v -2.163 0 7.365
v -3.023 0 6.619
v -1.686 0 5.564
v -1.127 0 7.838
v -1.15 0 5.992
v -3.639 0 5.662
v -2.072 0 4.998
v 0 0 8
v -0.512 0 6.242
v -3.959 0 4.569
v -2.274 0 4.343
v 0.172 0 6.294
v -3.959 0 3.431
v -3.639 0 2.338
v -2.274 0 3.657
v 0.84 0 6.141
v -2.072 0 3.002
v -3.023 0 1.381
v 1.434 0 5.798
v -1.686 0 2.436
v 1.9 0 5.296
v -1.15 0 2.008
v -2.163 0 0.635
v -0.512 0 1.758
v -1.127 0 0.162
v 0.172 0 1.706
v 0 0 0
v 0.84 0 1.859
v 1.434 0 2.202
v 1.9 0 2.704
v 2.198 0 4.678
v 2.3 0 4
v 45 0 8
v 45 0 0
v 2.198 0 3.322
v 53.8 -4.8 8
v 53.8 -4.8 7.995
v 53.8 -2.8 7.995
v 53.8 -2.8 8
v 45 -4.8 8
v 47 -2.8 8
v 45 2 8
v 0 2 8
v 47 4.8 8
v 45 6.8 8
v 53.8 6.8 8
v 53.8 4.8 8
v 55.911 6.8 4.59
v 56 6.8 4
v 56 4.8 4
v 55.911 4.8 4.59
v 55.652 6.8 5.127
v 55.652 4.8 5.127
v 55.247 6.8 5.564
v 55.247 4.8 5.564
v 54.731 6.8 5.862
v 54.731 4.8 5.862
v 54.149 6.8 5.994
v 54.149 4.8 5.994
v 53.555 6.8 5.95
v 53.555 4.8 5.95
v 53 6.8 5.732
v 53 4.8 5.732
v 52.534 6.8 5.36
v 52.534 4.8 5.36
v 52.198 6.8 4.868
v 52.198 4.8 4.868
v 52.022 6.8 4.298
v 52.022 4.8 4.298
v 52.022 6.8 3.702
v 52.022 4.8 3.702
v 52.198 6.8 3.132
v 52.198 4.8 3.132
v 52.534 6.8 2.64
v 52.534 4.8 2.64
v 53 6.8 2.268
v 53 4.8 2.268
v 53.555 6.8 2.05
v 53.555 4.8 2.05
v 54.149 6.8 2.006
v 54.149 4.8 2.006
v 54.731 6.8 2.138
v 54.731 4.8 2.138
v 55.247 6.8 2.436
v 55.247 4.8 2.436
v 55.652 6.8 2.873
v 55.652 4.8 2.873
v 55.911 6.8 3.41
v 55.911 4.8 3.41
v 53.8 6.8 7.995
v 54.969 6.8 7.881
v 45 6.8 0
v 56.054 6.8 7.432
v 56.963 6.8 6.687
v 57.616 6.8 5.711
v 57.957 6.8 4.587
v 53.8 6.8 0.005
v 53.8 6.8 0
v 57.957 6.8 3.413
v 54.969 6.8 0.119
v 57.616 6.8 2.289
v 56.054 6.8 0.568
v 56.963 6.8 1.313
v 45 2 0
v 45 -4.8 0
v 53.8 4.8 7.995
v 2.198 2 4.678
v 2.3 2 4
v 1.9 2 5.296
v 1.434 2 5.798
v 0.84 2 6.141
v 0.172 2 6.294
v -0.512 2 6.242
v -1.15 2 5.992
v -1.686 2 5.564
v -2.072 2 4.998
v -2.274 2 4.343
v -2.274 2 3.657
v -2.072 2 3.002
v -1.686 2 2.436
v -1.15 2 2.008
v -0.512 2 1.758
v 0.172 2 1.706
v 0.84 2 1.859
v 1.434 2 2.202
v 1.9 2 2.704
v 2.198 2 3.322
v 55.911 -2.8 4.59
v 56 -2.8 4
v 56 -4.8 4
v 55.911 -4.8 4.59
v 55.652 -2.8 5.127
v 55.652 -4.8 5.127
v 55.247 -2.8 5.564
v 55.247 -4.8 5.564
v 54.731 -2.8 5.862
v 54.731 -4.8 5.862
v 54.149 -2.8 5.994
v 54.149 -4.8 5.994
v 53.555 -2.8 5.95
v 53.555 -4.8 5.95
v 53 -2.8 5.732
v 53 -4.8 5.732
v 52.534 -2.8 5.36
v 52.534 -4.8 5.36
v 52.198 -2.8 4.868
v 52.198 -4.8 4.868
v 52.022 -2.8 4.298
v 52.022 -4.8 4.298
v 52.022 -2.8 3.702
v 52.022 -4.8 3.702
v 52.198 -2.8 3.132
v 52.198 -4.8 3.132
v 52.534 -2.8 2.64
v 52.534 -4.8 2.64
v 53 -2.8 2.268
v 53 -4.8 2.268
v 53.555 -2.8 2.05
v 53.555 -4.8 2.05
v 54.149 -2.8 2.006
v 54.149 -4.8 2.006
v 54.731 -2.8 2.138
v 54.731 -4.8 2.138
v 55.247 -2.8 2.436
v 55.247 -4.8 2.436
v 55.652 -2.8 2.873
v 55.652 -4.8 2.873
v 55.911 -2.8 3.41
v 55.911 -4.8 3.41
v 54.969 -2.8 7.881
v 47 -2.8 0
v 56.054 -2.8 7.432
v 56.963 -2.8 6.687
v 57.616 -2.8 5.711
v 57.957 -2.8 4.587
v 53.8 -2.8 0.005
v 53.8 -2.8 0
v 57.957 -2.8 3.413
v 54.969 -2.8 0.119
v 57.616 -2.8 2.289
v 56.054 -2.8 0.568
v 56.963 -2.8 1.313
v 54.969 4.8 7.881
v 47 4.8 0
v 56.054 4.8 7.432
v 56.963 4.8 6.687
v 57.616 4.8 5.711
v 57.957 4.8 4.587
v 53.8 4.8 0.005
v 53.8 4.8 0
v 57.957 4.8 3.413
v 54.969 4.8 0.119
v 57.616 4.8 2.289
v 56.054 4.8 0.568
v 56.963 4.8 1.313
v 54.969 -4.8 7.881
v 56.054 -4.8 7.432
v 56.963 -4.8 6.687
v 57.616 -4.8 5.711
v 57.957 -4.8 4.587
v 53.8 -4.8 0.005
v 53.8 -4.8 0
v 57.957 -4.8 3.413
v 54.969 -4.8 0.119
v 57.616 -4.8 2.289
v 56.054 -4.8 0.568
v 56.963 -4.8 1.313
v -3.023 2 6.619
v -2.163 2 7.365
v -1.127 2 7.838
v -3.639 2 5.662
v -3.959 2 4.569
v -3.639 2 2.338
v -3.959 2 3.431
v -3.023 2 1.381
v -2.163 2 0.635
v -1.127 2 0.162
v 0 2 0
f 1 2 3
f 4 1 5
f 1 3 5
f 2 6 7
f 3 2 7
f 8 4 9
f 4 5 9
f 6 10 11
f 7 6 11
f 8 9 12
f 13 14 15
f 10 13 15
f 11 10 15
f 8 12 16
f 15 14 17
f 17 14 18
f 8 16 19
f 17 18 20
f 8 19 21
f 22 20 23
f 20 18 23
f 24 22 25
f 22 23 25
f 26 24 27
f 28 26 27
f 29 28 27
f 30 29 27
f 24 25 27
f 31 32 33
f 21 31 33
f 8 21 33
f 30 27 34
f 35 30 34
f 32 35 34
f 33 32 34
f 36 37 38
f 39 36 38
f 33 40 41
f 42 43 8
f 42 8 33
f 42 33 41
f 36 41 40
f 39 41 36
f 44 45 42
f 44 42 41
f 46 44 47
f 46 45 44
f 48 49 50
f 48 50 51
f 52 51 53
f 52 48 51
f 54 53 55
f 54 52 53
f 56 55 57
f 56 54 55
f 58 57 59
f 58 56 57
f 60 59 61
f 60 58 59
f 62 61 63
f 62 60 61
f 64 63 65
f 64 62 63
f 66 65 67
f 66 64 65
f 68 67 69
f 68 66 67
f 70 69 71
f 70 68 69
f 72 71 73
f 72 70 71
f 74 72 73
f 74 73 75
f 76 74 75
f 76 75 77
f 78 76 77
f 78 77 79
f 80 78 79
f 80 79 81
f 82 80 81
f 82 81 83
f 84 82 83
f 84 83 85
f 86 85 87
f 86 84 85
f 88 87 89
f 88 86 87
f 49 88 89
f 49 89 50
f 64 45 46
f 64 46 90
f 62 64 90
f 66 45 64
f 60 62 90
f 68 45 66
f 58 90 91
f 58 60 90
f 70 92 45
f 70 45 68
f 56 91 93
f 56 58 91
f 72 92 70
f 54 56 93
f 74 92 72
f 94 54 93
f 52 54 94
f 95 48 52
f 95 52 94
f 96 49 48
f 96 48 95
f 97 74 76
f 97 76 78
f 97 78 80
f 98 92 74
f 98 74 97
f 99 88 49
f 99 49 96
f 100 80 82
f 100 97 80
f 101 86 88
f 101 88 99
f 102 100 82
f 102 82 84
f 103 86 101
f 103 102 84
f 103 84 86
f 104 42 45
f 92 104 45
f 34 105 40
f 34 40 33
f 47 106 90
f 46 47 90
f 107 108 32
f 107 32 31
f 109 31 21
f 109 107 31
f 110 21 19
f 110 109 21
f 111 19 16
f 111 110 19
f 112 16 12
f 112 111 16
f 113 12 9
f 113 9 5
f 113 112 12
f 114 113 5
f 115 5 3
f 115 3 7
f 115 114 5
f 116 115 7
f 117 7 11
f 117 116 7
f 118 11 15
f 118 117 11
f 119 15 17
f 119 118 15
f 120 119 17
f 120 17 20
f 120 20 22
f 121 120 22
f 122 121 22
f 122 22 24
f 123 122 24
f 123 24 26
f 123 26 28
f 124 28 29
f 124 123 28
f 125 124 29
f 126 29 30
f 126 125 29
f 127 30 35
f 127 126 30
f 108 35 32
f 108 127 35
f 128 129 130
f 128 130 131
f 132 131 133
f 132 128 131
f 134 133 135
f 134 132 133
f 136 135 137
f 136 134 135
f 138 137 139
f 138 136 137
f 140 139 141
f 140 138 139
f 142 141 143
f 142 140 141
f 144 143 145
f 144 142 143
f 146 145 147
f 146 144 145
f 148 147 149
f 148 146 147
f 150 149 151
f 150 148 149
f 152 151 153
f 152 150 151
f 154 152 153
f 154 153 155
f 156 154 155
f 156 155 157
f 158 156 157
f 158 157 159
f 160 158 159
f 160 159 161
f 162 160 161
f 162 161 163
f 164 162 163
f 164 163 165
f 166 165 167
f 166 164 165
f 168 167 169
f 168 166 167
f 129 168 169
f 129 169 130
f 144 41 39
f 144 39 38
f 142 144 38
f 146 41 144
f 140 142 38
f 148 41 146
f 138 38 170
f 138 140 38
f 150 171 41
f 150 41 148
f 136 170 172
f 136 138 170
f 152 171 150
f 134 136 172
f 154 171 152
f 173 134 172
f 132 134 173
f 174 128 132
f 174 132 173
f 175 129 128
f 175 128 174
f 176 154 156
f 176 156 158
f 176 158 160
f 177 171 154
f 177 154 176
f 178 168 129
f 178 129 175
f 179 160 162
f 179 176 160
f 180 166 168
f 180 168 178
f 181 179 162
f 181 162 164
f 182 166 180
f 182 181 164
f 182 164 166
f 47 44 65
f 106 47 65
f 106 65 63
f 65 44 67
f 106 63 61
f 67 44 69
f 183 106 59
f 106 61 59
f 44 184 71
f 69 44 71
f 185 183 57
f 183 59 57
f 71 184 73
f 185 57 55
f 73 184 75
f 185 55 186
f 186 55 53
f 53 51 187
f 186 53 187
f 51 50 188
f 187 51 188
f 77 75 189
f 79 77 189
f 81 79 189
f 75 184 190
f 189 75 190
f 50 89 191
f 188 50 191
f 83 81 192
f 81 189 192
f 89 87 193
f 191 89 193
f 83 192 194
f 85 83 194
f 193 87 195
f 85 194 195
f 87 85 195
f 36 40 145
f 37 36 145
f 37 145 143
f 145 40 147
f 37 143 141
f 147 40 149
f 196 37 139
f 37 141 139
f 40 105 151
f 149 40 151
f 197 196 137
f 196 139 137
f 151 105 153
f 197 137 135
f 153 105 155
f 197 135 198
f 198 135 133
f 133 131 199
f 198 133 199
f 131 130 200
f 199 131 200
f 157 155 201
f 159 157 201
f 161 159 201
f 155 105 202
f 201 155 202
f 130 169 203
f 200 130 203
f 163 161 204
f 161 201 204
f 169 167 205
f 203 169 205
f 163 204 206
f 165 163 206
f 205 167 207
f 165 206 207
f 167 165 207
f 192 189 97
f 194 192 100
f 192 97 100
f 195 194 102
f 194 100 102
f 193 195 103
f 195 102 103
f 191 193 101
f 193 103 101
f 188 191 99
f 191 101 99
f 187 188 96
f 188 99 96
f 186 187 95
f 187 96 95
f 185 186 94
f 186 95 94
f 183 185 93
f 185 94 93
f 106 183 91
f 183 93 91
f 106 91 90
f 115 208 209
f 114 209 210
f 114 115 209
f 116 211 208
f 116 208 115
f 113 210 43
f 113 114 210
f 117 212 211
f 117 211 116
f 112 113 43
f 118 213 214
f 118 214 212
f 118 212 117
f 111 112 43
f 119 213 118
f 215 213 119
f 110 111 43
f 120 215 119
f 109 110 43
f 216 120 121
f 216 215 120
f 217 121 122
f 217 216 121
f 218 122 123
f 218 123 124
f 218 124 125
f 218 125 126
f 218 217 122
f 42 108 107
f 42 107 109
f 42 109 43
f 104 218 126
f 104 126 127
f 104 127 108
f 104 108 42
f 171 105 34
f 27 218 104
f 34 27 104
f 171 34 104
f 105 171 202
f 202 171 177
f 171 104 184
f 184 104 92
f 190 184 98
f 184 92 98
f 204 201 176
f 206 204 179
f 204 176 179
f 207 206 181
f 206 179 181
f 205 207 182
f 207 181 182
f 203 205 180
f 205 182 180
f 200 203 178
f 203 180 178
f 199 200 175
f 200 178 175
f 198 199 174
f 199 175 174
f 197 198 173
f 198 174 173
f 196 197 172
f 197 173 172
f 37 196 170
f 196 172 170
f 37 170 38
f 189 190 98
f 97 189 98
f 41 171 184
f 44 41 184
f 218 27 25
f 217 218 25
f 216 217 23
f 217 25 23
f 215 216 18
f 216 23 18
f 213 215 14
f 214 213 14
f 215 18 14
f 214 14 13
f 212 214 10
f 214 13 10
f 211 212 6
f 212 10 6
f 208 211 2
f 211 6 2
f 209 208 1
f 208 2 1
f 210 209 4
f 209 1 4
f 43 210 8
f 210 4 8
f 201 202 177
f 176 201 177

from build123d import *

# Parameters (mm, degrees)
CYLINDER003_R     = 2
CYLINDER003_DEPTH = 2
BOX002_W          = 6.8
BOX002_H          = 2
BOX002_DEPTH      = 8
CYLINDER002_R     = 4
CYLINDER002_DEPTH = 2
CYLINDER001_R     = 2.3
CYLINDER001_DEPTH = 2
CYLINDER_R        = 4
CYLINDER_DEPTH    = 2
BOX_W             = 45
BOX_H             = 2
BOX_DEPTH         = 8
CYLINDER005_R     = 2
CYLINDER005_DEPTH = 2
BOX003_W          = 6.8
BOX003_H          = 2
BOX003_DEPTH      = 8
CYLINDER004_R     = 4
CYLINDER004_DEPTH = 2
BOX001_W          = 2
BOX001_H          = 11.6
BOX001_DEPTH      = 8


with BuildPart() as cylinder003:
    # Cylinder003 → Cylinder003 (new body)
    with BuildSketch(Plane(origin=(54, 6.8, 4), x_dir=(1, 0, 0), z_dir=(0, -1, 0))):
        Circle(CYLINDER003_R)
    extrude(amount=CYLINDER003_DEPTH)


with BuildPart() as cube002:
    # Box002 → Box002 (new body)
    with BuildSketch(Plane(origin=(47, 4.8, 0), x_dir=(1, 0, 0), z_dir=(0, 0, 1))):
        with Locations((3.4, 1)):
            Rectangle(BOX002_W, BOX002_H)
    extrude(amount=BOX002_DEPTH)


with BuildPart() as cut001:
    # Cylinder002 → Cylinder002 (new body)
    with BuildSketch(Plane(origin=(54, 6.8, 4), x_dir=(1, 0, 0), z_dir=(0, -1, 0))):
        Circle(CYLINDER002_R)
    extrude(amount=CYLINDER002_DEPTH)

    # Fusion001: union Cube002
    add(cube002.part)

    # Cut001: cut Cylinder003
    add(cylinder003.part, mode=Mode.SUBTRACT)


with BuildPart() as cylinder001:
    # Cylinder001 → Cylinder001 (new body)
    with BuildSketch(Plane(origin=(0, 2, 4), x_dir=(1, 0, 0), z_dir=(0, -1, 0))):
        Circle(CYLINDER001_R)
    extrude(amount=CYLINDER001_DEPTH)


with BuildPart() as cylinder:
    # Cylinder → Cylinder (new body)
    with BuildSketch(Plane(origin=(0, 0, 4), x_dir=(1, 0, 0), z_dir=(0, 1, 0))):
        Circle(CYLINDER_R)
    extrude(amount=CYLINDER_DEPTH)


with BuildPart() as cut:
    # Box → Box (new body)
    with BuildSketch(Plane.XY):
        with Locations((22.5, 1)):
            Rectangle(BOX_W, BOX_H)
    extrude(amount=BOX_DEPTH)

    # Fusion: union Cylinder
    add(cylinder.part)

    # Cut: cut Cylinder001
    add(cylinder001.part, mode=Mode.SUBTRACT)


with BuildPart() as cylinder005:
    # Cylinder005 → Cylinder005 (new body)
    with BuildSketch(Plane(origin=(54, 6.8, 4), x_dir=(1, 0, 0), z_dir=(0, -1, 0))):
        Circle(CYLINDER005_R)
    extrude(amount=CYLINDER005_DEPTH)


with BuildPart() as cube003:
    # Box003 → Box003 (new body)
    with BuildSketch(Plane(origin=(47, 4.8, 0), x_dir=(1, 0, 0), z_dir=(0, 0, 1))):
        with Locations((3.4, 1)):
            Rectangle(BOX003_W, BOX003_H)
    extrude(amount=BOX003_DEPTH)


with BuildPart() as cut002:
    # Cylinder004 → Cylinder004 (new body)
    with BuildSketch(Plane(origin=(54, 6.8, 4), x_dir=(1, 0, 0), z_dir=(0, -1, 0))):
        Circle(CYLINDER004_R)
    extrude(amount=CYLINDER004_DEPTH)

    # Fusion002: union Cube003
    add(cube003.part)

    # Cut002: cut Cylinder005
    add(cylinder005.part, mode=Mode.SUBTRACT)


with BuildPart() as cut002_1:
    # Cut002 placement: moved
    add(cut002.part.moved(Location((0, -9.6, 0))))


with BuildPart() as fusion003:
    # Box001 → Box001 (new body)
    with BuildSketch(Plane(origin=(45, -4.8, 0), x_dir=(1, 0, 0), z_dir=(0, 0, 1))):
        with Locations((1, 5.8)):
            Rectangle(BOX001_W, BOX001_H)
    extrude(amount=BOX001_DEPTH)

    # Fusion003: union Cut001, Cut, Cut002
    add(cut001.part)
    add(cut.part)
    add(cut002_1.part)


solid = fusion003.part
